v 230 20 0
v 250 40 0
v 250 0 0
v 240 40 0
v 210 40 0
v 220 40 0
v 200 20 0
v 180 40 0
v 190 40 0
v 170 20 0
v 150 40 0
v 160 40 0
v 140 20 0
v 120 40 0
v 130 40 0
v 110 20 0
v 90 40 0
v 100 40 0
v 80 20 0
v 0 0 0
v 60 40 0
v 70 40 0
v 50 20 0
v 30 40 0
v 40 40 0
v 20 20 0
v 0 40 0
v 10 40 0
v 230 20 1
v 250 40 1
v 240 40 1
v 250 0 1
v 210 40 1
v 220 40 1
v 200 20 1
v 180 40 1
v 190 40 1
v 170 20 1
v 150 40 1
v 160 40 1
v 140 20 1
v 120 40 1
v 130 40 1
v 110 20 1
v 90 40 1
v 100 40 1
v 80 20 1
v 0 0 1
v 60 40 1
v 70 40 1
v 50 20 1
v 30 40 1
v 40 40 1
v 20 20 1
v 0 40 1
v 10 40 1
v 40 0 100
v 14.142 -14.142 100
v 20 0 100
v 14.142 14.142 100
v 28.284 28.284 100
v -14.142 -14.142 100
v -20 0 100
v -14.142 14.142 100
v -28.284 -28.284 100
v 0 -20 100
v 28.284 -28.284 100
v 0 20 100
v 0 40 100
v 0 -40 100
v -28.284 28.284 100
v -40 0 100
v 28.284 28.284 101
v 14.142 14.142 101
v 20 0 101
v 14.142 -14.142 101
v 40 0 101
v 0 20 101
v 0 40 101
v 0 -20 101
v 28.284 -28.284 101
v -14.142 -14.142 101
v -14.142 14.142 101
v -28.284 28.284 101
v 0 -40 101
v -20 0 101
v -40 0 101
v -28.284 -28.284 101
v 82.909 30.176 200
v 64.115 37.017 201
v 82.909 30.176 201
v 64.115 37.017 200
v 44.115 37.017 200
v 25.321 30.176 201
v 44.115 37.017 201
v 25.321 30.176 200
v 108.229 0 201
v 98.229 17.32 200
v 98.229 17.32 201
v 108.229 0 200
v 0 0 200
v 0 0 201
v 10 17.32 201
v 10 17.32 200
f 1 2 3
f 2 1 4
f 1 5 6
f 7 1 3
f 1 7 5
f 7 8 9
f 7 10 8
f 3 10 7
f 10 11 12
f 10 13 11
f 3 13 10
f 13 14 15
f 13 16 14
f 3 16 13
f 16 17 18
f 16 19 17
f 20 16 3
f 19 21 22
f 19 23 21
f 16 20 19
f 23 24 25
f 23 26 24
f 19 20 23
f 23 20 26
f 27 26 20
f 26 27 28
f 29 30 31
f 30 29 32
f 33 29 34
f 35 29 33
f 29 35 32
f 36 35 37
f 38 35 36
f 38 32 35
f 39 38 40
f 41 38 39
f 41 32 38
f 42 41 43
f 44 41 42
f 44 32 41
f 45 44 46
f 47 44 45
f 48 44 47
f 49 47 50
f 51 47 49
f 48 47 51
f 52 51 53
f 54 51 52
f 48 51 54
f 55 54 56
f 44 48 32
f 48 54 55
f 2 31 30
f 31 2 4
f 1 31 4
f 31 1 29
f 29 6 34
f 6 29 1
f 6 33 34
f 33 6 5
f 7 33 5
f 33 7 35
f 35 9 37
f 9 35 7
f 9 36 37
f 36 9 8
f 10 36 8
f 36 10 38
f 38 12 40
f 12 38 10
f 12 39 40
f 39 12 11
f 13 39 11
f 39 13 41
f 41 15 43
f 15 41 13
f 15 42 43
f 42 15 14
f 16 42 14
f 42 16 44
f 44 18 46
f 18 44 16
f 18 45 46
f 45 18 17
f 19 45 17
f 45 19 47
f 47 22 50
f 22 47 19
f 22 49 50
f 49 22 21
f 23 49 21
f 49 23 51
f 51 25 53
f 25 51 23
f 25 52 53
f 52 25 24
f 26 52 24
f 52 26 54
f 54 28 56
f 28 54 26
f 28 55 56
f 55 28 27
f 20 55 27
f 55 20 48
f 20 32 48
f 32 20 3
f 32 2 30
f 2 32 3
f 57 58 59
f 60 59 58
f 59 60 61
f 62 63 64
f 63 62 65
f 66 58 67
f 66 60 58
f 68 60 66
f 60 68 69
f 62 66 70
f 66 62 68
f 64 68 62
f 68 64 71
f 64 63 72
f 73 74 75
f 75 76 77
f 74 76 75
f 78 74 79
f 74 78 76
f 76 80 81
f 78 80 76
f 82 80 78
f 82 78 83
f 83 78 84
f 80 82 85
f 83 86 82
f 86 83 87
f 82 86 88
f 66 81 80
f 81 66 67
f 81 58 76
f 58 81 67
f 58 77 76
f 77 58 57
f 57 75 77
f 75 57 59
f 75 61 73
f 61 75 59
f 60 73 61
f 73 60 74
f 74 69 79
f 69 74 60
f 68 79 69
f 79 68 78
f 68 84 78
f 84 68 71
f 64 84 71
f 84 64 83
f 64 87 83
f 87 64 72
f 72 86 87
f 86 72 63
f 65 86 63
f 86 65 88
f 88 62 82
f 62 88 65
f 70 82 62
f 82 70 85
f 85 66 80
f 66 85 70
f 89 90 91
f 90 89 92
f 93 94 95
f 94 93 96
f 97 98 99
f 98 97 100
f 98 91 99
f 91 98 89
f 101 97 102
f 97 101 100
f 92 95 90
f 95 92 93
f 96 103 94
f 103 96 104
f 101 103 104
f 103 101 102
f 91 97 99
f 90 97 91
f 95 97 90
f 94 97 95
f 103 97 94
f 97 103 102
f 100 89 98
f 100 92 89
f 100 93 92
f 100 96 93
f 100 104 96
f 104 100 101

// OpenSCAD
// Generated by Parametrix
ca_myPartE_faceCartesian_000 = [ [ 0.0000, 0.0000 ],[ 0.0000, 40.0000 ],[ 10.0000, 40.0000 ],[ 20.0000, 20.0000 ],[ 30.0000, 40.0000 ],[ 40.0000, 40.0000 ],[ 50.0000, 20.0000 ],[ 60.0000, 40.0000 ],[ 70.0000, 40.0000 ],[ 80.0000, 20.0000 ],[ 90.0000, 40.0000 ],[ 100.0000, 40.0000 ],[ 110.0000, 20.0000 ],[ 120.0000, 40.0000 ],[ 130.0000, 40.0000 ],[ 140.0000, 20.0000 ],[ 150.0000, 40.0000 ],[ 160.0000, 40.0000 ],[ 170.0000, 20.0000 ],[ 180.0000, 40.0000 ],[ 190.0000, 40.0000 ],[ 200.0000, 20.0000 ],[ 210.0000, 40.0000 ],[ 220.0000, 40.0000 ],[ 230.0000, 20.0000 ],[ 240.0000, 40.0000 ],[ 250.0000, 40.0000 ],[ 250.0000, 0.0000 ],[ 0.0000, 0.0000 ] ];
cb_myPartE_faceCartesian_000 = [  0, 1, 2, 3, 4, 5, 6, 7, 8, 9, 10, 11, 12, 13, 14, 15, 16, 17, 18, 19, 20, 21, 22, 23, 24, 25, 26, 27, 28 ];
a_myPartE_faceCartesian = concat(ca_myPartE_faceCartesian_000);
b_myPartE_faceCartesian = [cb_myPartE_faceCartesian_000];
ca_myPartE_facePolarAbs_000 = [ [ 20.0000, 0.0000 ],[ 28.2843, 28.2843 ],[ 14.1421, 14.1421 ],[ 0.0000, 40.0000 ],[ 0.0000, 20.0000 ],[ -28.2843, 28.2843 ],[ -14.1421, 14.1421 ],[ -40.0000, 0.0000 ],[ -20.0000, 0.0000 ],[ -28.2843, -28.2843 ],[ -14.1421, -14.1421 ],[ -0.0000, -40.0000 ],[ -0.0000, -20.0000 ],[ 28.2843, -28.2843 ],[ 14.1421, -14.1421 ],[ 40.0000, 0.0000 ],[ 20.0000, 0.0000 ] ];
cb_myPartE_facePolarAbs_000 = [  0, 1, 2, 3, 4, 5, 6, 7, 8, 9, 10, 11, 12, 13, 14, 15, 16 ];
a_myPartE_facePolarAbs = concat(ca_myPartE_facePolarAbs_000);
b_myPartE_facePolarAbs = [cb_myPartE_facePolarAbs_000];
ca_myPartE_facePolarRel_000 = [ [ 0.0000, 0.0000 ],[ 10.0000, 17.3205 ],[ 25.3209, 30.1763 ],[ 44.1147, 37.0167 ],[ 64.1147, 37.0167 ],[ 82.9086, 30.1763 ],[ 98.2295, 17.3205 ],[ 108.2295, 0.0000 ],[ 0.0000, 0.0000 ] ];
cb_myPartE_facePolarRel_000 = [  0, 1, 2, 3, 4, 5, 6, 7, 8 ];
a_myPartE_facePolarRel = concat(ca_myPartE_facePolarRel_000);
b_myPartE_facePolarRel = [cb_myPartE_facePolarRel_000];

module subpax_myPartE_cartesian () {
	translate( [ 0, 0, 0 ])
		rotate( [ 0, 0, 0 ])
			   linear_extrude(height = 1) polygon(a_myPartE_faceCartesian, b_myPartE_faceCartesian);
}

module subpax_myPartE_polarAbs () {
	translate( [ 0, 0, 100 ])
		rotate( [ 0, 0, 0 ])
			   linear_extrude(height = 1) polygon(a_myPartE_facePolarAbs, b_myPartE_facePolarAbs);
}

module subpax_myPartE_polarRel () {
	translate( [ 0, 0, 200 ])
		rotate( [ 0, 0, 0 ])
			   linear_extrude(height = 1) polygon(a_myPartE_facePolarRel, b_myPartE_facePolarRel);
}

module pax_myPartE () {
	union () {
		subpax_myPartE_cartesian();
subpax_myPartE_polarAbs();
subpax_myPartE_polarRel();
	}
}

pax_myPartE();
